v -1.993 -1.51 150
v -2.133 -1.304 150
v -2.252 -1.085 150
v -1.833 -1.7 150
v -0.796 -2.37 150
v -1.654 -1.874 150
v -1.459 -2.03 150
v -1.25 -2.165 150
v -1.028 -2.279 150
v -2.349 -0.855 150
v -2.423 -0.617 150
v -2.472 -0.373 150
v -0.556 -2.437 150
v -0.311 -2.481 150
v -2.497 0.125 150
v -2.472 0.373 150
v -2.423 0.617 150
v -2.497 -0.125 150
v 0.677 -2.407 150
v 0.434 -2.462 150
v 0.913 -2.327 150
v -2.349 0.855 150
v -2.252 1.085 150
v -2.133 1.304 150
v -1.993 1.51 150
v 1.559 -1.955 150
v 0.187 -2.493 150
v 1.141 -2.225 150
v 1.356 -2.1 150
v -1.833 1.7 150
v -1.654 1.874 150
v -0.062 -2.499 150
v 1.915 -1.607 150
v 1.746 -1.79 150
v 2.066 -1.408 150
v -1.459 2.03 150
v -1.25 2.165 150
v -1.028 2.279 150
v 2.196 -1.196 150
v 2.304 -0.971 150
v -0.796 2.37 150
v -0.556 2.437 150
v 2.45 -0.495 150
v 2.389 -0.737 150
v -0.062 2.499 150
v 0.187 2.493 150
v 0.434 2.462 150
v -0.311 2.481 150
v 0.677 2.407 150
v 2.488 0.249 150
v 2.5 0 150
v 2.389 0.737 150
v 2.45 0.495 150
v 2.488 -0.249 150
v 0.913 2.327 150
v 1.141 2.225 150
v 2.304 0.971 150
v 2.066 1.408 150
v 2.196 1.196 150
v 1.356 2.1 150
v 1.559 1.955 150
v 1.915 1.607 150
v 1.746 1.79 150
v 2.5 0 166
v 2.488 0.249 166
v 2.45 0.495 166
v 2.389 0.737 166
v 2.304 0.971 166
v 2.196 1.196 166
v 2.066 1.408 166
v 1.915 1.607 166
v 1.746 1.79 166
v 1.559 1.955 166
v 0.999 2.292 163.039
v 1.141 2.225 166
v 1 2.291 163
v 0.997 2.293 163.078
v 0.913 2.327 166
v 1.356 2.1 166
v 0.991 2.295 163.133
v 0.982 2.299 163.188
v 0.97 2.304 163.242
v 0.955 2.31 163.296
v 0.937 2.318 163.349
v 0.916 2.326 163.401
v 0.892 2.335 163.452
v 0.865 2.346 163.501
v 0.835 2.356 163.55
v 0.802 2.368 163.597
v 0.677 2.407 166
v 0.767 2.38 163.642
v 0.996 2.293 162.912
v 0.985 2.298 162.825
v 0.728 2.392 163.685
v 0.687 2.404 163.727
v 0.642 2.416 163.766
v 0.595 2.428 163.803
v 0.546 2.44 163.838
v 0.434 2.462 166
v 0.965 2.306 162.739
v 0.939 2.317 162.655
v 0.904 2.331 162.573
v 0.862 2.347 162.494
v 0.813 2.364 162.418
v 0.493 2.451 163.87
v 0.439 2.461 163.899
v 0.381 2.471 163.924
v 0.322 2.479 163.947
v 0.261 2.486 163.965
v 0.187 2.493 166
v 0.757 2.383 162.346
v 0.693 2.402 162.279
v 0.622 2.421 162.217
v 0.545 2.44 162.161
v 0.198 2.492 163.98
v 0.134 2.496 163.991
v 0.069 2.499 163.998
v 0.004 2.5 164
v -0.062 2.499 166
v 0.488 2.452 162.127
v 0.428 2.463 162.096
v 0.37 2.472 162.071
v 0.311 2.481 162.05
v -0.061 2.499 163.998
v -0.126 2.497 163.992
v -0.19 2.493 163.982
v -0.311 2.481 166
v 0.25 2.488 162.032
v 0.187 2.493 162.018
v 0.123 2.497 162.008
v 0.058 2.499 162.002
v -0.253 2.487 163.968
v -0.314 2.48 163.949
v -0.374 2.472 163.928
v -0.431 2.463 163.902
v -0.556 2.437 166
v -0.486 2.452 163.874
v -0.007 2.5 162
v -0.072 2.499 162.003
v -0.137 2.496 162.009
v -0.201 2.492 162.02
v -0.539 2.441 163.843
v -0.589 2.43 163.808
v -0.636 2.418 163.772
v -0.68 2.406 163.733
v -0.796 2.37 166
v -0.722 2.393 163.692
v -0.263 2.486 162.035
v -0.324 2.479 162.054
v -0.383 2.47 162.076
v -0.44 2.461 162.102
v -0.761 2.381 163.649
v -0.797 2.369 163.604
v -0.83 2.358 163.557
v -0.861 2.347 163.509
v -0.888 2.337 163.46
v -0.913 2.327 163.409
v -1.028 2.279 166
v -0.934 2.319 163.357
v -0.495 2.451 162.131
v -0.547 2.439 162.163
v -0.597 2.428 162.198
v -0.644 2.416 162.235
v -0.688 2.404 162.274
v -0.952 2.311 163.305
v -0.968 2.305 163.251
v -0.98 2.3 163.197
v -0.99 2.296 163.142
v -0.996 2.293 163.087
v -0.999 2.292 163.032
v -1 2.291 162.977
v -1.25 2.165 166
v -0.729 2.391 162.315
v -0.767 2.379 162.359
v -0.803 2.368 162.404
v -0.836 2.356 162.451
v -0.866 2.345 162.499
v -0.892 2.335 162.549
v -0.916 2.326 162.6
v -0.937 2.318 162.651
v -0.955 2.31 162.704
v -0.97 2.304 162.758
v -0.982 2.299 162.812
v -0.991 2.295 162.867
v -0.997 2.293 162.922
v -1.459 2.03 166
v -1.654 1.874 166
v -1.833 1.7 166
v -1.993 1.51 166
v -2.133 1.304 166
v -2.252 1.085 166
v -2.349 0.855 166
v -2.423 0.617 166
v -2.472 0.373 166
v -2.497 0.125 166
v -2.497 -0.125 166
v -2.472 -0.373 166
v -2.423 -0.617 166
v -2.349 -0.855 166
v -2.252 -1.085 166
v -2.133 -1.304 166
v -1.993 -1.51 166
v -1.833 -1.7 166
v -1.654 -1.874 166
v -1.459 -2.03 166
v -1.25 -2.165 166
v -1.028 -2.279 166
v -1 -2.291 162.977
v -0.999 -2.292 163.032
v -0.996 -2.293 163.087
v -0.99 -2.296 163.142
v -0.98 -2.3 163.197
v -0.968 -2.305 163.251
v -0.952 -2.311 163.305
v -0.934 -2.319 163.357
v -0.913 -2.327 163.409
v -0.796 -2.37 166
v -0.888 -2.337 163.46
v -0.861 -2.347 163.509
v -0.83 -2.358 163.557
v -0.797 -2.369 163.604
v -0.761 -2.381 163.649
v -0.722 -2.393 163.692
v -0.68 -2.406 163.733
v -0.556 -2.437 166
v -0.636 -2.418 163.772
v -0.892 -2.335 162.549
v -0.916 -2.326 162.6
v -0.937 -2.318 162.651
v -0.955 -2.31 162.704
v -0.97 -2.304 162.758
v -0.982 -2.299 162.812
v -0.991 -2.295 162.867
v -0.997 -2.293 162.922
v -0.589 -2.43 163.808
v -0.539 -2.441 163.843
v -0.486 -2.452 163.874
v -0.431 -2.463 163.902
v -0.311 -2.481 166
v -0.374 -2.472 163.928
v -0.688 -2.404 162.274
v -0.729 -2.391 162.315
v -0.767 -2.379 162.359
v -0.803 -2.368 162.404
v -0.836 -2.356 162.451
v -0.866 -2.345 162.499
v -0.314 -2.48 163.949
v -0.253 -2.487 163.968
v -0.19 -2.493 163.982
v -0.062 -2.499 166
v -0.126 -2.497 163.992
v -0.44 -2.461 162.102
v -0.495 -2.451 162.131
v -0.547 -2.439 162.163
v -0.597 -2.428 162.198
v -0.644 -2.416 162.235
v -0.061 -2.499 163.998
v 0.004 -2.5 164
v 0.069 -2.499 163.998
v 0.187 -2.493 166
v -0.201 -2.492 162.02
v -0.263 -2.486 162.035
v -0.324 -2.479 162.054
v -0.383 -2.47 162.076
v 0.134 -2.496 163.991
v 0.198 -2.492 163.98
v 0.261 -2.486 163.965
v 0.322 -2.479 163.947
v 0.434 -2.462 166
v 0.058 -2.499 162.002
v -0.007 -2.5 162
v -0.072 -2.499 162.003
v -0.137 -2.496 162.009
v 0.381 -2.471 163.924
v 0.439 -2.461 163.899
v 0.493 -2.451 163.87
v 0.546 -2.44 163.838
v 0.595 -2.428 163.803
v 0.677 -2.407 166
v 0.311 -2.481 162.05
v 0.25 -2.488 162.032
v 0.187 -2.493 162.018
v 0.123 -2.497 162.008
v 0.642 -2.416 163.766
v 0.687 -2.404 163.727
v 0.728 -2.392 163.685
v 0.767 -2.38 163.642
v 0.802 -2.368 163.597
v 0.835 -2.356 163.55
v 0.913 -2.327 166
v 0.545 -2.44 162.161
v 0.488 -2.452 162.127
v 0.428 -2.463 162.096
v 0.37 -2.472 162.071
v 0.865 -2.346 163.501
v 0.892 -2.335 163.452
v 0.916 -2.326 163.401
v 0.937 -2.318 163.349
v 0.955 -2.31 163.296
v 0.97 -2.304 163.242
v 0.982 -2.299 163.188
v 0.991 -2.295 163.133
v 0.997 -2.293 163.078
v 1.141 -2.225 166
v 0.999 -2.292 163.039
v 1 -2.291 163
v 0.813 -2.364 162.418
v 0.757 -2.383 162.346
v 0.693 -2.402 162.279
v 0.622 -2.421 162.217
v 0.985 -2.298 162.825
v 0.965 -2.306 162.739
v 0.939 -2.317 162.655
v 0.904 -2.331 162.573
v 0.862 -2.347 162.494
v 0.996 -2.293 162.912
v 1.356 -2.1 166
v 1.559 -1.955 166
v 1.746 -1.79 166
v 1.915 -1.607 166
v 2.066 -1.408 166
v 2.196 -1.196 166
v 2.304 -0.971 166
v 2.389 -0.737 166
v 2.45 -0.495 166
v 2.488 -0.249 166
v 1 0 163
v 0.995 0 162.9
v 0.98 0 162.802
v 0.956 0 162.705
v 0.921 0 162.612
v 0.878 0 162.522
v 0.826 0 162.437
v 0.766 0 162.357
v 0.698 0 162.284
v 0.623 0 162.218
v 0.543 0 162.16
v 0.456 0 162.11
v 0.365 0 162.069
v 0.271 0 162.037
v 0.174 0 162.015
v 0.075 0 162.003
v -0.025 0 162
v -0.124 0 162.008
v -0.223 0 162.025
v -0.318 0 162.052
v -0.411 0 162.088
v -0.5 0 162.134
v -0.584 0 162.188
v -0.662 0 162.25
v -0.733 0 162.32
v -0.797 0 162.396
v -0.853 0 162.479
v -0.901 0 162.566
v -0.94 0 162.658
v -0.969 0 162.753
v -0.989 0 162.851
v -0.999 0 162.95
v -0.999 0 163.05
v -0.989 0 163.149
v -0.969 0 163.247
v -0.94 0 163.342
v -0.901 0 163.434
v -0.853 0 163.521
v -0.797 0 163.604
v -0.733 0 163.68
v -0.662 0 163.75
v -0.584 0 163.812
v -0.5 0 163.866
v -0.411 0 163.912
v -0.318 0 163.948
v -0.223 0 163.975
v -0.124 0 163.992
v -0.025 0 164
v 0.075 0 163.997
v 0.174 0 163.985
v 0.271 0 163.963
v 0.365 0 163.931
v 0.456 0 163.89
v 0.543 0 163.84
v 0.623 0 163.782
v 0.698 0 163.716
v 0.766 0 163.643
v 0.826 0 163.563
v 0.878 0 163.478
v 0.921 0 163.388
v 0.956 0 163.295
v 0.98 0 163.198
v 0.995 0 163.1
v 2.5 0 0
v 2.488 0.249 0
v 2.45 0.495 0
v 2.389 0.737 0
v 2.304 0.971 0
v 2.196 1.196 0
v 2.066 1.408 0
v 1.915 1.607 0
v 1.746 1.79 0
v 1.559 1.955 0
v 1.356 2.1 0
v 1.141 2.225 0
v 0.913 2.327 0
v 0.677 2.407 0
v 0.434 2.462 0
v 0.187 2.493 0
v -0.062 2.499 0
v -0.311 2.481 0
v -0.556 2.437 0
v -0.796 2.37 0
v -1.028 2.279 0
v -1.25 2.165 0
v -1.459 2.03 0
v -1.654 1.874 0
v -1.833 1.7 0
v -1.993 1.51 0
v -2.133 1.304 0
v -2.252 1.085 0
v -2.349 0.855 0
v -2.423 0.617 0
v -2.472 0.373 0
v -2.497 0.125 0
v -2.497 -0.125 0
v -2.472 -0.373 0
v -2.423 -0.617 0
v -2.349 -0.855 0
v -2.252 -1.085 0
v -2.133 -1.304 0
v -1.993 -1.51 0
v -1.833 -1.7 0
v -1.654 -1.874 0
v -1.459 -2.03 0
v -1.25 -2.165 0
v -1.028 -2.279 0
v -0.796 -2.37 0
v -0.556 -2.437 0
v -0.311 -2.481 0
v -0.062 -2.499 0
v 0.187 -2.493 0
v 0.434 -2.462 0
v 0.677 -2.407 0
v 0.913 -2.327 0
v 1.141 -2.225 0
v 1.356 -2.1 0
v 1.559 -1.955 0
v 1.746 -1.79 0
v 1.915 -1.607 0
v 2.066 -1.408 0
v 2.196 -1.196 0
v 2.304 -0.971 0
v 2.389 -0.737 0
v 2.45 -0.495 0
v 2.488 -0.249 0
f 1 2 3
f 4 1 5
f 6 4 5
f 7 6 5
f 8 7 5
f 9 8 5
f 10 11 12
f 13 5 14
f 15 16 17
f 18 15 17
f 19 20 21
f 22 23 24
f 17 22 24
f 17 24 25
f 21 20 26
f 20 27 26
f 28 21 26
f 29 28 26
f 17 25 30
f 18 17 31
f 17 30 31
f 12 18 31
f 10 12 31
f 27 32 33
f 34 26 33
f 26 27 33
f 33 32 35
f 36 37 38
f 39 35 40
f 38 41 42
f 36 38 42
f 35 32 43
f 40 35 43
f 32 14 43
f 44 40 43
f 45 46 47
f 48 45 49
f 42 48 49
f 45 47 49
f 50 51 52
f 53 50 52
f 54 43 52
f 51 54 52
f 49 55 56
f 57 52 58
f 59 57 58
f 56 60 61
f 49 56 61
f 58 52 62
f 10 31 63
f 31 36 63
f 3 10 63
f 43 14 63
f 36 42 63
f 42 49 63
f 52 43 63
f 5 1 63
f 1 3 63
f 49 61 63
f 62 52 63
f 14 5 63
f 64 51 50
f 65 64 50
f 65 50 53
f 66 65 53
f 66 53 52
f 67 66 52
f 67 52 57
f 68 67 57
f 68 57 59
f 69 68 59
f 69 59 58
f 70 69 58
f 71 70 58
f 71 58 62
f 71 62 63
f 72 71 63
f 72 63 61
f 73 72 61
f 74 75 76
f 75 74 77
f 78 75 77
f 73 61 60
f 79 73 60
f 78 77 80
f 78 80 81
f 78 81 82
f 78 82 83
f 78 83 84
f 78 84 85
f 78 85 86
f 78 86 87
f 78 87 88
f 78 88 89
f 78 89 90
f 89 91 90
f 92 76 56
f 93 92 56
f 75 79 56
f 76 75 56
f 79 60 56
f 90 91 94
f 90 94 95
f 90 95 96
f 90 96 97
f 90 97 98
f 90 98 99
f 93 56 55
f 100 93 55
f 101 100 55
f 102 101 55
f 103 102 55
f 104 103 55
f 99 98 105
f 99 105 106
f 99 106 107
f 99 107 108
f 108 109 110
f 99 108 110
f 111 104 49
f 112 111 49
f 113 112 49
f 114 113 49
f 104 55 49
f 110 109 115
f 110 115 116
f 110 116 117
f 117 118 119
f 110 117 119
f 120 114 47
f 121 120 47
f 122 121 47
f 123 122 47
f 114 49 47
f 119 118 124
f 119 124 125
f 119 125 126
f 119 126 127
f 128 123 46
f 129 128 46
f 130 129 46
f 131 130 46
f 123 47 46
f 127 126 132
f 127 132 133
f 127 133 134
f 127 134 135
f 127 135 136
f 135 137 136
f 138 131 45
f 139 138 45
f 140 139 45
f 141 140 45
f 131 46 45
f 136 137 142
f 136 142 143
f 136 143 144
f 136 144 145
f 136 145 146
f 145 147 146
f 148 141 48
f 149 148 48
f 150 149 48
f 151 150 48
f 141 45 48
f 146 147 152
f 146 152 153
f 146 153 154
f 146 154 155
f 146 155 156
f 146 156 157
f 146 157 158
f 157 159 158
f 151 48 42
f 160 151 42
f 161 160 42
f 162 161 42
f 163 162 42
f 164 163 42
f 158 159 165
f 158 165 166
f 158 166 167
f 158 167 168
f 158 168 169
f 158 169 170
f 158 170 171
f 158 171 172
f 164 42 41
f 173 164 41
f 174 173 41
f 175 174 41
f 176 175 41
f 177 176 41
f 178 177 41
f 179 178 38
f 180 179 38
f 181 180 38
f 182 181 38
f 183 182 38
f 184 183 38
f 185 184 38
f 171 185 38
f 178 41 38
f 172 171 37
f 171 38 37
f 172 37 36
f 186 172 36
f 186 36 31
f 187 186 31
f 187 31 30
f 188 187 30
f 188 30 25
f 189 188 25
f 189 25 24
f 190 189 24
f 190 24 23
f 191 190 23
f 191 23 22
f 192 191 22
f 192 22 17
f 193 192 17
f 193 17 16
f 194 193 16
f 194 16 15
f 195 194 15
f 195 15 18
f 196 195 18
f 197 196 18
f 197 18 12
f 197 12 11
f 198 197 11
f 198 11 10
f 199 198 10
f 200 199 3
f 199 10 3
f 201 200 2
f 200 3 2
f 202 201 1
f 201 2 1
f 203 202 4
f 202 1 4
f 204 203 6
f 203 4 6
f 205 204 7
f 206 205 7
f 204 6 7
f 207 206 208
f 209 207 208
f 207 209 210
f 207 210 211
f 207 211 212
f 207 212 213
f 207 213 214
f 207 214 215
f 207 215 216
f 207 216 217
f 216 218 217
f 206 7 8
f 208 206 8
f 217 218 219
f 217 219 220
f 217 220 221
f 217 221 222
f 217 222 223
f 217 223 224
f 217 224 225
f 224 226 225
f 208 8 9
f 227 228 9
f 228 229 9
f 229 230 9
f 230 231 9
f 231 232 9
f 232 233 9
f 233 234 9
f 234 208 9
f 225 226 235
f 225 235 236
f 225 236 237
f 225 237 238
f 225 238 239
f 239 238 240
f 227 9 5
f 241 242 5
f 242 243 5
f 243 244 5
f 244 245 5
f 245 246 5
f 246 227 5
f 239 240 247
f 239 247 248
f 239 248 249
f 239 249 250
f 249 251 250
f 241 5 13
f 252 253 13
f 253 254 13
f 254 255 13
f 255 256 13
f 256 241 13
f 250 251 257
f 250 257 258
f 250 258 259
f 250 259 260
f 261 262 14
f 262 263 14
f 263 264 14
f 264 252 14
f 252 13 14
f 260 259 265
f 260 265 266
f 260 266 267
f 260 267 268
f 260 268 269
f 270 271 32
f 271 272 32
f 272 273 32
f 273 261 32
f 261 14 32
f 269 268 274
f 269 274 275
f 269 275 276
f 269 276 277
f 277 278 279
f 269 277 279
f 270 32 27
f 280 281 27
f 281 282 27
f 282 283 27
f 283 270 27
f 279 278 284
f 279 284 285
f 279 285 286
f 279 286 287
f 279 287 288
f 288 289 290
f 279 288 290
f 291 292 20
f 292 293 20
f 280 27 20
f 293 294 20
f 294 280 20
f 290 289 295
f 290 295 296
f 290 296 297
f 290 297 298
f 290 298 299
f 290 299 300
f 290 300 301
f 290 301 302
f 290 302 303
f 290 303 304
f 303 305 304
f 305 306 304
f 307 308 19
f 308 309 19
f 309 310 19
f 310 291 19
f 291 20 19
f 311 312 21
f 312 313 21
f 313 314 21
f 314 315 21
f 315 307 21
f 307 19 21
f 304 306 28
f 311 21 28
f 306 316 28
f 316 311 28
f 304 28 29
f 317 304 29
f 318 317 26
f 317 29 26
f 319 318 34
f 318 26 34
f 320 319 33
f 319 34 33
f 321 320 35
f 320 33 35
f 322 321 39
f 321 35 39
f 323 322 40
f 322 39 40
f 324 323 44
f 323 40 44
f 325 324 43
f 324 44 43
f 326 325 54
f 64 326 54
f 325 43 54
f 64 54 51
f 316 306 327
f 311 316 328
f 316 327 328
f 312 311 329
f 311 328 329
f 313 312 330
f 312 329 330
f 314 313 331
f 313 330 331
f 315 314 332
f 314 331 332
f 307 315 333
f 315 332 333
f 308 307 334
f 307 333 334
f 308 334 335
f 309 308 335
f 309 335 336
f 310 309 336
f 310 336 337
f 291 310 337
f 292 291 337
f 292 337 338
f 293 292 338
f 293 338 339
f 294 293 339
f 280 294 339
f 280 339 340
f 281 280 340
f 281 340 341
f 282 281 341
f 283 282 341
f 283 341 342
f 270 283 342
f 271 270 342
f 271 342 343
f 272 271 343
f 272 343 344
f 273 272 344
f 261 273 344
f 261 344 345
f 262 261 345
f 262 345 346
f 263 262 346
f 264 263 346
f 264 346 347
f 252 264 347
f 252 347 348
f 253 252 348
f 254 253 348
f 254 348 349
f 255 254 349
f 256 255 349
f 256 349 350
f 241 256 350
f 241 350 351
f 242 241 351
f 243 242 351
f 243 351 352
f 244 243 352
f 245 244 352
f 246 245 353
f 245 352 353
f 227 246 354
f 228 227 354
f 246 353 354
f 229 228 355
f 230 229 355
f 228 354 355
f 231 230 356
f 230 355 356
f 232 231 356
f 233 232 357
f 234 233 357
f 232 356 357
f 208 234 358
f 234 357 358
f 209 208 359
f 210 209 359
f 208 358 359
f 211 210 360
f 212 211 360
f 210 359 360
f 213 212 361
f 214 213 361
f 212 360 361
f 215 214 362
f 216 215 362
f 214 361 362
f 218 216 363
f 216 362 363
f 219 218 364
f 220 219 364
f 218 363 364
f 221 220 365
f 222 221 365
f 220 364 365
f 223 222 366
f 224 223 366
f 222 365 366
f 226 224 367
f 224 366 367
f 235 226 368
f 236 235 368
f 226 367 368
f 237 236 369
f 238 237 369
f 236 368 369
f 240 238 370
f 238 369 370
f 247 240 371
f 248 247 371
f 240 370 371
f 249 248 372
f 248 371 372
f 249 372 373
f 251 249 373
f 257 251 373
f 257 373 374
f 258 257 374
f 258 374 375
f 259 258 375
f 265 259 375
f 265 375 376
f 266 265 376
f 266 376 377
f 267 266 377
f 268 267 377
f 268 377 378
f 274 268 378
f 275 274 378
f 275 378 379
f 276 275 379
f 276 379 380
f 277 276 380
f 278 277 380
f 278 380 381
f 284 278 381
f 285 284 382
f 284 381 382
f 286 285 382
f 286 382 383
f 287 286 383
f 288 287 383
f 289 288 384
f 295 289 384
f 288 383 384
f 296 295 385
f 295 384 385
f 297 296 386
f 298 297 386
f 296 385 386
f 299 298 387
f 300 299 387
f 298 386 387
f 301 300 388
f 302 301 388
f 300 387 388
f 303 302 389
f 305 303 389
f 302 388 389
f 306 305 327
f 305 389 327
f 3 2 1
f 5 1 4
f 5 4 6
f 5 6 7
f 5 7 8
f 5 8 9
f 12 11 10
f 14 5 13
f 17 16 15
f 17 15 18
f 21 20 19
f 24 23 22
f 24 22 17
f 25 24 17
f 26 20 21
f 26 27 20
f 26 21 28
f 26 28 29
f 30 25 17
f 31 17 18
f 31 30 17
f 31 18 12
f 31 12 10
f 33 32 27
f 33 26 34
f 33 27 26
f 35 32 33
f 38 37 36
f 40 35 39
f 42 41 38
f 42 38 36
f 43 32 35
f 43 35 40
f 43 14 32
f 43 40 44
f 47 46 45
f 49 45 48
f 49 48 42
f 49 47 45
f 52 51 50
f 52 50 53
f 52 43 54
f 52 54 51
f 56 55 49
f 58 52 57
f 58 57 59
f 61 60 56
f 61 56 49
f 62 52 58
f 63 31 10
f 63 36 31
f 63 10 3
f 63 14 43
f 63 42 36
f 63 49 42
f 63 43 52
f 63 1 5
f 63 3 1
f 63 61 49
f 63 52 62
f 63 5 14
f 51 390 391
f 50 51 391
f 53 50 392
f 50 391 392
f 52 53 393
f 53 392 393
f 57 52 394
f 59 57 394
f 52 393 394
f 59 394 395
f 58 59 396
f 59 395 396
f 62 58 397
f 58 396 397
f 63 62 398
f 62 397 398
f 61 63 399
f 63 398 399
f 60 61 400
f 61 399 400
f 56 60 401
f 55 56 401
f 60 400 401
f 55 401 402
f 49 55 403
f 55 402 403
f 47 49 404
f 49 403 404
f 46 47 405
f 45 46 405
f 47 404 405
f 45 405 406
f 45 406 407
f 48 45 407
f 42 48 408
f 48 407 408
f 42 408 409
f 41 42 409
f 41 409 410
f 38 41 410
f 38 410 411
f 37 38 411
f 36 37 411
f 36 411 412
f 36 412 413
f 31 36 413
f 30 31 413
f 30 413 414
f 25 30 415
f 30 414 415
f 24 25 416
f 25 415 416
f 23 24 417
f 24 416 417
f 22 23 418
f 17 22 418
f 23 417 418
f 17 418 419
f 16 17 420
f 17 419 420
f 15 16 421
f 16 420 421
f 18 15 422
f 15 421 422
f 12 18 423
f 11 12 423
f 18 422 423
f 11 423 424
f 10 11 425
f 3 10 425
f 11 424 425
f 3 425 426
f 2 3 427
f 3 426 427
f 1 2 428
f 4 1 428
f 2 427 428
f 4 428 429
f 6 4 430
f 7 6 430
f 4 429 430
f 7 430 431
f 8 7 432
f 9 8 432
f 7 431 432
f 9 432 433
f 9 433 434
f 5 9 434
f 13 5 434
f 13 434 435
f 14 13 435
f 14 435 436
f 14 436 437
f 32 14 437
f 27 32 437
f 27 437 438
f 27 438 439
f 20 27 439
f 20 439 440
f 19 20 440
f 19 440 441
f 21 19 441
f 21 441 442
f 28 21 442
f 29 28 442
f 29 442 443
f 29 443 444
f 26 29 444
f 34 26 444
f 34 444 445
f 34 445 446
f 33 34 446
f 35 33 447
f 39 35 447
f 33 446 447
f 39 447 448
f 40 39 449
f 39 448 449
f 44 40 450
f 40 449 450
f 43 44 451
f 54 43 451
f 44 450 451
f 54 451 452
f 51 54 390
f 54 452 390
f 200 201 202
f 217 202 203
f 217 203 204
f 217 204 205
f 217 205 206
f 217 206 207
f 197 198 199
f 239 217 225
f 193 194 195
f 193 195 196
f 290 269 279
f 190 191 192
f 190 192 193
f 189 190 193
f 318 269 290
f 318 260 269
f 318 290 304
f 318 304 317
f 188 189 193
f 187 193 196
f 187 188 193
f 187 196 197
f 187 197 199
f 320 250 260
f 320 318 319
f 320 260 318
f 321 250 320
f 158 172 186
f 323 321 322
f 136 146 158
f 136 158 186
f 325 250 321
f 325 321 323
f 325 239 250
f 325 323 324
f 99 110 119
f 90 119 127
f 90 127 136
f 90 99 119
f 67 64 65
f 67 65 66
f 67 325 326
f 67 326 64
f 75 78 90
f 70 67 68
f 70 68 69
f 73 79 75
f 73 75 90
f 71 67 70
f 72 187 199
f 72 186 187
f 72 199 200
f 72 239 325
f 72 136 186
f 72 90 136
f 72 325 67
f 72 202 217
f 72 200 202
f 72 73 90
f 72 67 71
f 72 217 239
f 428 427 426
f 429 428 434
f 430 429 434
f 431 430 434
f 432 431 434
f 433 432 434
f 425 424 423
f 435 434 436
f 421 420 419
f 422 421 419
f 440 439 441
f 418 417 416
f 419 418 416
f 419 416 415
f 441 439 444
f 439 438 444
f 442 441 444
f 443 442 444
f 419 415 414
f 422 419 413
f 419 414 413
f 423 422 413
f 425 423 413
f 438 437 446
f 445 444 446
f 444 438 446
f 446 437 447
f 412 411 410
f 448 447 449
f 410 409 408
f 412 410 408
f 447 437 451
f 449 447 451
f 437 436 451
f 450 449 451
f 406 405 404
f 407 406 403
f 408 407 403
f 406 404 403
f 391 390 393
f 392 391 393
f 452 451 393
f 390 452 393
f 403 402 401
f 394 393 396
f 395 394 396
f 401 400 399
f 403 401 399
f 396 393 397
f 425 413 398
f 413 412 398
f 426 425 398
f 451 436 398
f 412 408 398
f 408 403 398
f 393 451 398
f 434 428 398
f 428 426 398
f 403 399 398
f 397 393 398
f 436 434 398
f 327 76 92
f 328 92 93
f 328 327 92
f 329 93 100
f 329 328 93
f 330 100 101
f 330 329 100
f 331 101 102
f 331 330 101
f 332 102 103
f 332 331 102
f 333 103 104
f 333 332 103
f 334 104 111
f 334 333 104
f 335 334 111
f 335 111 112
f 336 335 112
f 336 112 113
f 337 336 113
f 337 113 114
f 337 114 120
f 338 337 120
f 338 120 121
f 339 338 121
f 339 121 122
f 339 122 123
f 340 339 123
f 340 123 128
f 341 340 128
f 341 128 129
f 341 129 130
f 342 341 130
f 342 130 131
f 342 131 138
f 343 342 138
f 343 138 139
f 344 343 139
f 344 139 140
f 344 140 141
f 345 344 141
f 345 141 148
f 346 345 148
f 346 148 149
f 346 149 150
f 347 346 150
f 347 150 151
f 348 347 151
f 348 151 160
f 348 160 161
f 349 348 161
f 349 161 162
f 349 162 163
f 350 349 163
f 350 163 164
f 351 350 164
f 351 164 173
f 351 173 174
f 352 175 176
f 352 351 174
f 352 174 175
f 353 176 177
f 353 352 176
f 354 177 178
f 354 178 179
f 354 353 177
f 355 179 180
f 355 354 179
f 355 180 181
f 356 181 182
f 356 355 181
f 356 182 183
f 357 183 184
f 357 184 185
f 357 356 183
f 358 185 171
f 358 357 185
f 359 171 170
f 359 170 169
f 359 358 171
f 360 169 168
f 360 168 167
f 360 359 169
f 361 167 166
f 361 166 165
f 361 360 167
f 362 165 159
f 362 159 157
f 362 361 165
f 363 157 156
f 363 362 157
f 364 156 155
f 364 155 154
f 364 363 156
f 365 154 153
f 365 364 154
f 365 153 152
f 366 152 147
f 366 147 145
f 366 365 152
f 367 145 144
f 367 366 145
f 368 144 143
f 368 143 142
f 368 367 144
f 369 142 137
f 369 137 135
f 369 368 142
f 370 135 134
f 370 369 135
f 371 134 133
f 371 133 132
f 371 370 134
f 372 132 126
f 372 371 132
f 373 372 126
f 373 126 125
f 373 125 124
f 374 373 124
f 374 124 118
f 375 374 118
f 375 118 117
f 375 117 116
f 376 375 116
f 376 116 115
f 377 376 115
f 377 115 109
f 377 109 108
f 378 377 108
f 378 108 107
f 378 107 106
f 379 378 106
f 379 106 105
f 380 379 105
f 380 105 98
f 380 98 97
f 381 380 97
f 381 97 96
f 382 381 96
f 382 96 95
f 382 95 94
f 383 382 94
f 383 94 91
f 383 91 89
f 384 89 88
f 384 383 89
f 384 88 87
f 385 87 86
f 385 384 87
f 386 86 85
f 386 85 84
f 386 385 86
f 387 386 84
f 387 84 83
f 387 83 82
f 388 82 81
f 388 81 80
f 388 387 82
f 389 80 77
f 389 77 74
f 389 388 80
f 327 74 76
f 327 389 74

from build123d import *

# Parameters (mm, degrees)
SKETCH_1_R               = 2.5
EXTRUDE_1_DEPTH          = 150
SKETCH_2_R               = 2.5
EXTRUDE_2_DEPTH          = 16
SKETCH_3_R               = 1
CUT_EXTRUDE_1_DEPTH      = 3.5
CUT_EXTRUDE_1_DEPTH_BACK = 3.5


with BuildPart() as part:
    # 草图1 → 凸台-拉伸1 (new body)
    with BuildSketch(Plane.XY):
        Circle(SKETCH_1_R)
    extrude(amount=EXTRUDE_1_DEPTH)


with BuildPart() as body_2:
    # 草图2 → 凸台-拉伸2 (new body)
    with BuildSketch(Plane.XY.offset(150)):
        Circle(SKETCH_2_R)
    extrude(amount=EXTRUDE_2_DEPTH)

    # 草图3 → 切除-拉伸1 (cut, two sides)
    with BuildSketch(Plane(origin=(0, 0, 0), x_dir=(1, 0, 0), z_dir=(0, 1, 0))) as cut_extrude_1_sk:
        with Locations((0, -163)):
            Circle(SKETCH_3_R)
    extrude(amount=CUT_EXTRUDE_1_DEPTH, mode=Mode.SUBTRACT)
    extrude(cut_extrude_1_sk.sketch, amount=-CUT_EXTRUDE_1_DEPTH_BACK, mode=Mode.SUBTRACT)


solid = Compound([part.part, body_2.part])
